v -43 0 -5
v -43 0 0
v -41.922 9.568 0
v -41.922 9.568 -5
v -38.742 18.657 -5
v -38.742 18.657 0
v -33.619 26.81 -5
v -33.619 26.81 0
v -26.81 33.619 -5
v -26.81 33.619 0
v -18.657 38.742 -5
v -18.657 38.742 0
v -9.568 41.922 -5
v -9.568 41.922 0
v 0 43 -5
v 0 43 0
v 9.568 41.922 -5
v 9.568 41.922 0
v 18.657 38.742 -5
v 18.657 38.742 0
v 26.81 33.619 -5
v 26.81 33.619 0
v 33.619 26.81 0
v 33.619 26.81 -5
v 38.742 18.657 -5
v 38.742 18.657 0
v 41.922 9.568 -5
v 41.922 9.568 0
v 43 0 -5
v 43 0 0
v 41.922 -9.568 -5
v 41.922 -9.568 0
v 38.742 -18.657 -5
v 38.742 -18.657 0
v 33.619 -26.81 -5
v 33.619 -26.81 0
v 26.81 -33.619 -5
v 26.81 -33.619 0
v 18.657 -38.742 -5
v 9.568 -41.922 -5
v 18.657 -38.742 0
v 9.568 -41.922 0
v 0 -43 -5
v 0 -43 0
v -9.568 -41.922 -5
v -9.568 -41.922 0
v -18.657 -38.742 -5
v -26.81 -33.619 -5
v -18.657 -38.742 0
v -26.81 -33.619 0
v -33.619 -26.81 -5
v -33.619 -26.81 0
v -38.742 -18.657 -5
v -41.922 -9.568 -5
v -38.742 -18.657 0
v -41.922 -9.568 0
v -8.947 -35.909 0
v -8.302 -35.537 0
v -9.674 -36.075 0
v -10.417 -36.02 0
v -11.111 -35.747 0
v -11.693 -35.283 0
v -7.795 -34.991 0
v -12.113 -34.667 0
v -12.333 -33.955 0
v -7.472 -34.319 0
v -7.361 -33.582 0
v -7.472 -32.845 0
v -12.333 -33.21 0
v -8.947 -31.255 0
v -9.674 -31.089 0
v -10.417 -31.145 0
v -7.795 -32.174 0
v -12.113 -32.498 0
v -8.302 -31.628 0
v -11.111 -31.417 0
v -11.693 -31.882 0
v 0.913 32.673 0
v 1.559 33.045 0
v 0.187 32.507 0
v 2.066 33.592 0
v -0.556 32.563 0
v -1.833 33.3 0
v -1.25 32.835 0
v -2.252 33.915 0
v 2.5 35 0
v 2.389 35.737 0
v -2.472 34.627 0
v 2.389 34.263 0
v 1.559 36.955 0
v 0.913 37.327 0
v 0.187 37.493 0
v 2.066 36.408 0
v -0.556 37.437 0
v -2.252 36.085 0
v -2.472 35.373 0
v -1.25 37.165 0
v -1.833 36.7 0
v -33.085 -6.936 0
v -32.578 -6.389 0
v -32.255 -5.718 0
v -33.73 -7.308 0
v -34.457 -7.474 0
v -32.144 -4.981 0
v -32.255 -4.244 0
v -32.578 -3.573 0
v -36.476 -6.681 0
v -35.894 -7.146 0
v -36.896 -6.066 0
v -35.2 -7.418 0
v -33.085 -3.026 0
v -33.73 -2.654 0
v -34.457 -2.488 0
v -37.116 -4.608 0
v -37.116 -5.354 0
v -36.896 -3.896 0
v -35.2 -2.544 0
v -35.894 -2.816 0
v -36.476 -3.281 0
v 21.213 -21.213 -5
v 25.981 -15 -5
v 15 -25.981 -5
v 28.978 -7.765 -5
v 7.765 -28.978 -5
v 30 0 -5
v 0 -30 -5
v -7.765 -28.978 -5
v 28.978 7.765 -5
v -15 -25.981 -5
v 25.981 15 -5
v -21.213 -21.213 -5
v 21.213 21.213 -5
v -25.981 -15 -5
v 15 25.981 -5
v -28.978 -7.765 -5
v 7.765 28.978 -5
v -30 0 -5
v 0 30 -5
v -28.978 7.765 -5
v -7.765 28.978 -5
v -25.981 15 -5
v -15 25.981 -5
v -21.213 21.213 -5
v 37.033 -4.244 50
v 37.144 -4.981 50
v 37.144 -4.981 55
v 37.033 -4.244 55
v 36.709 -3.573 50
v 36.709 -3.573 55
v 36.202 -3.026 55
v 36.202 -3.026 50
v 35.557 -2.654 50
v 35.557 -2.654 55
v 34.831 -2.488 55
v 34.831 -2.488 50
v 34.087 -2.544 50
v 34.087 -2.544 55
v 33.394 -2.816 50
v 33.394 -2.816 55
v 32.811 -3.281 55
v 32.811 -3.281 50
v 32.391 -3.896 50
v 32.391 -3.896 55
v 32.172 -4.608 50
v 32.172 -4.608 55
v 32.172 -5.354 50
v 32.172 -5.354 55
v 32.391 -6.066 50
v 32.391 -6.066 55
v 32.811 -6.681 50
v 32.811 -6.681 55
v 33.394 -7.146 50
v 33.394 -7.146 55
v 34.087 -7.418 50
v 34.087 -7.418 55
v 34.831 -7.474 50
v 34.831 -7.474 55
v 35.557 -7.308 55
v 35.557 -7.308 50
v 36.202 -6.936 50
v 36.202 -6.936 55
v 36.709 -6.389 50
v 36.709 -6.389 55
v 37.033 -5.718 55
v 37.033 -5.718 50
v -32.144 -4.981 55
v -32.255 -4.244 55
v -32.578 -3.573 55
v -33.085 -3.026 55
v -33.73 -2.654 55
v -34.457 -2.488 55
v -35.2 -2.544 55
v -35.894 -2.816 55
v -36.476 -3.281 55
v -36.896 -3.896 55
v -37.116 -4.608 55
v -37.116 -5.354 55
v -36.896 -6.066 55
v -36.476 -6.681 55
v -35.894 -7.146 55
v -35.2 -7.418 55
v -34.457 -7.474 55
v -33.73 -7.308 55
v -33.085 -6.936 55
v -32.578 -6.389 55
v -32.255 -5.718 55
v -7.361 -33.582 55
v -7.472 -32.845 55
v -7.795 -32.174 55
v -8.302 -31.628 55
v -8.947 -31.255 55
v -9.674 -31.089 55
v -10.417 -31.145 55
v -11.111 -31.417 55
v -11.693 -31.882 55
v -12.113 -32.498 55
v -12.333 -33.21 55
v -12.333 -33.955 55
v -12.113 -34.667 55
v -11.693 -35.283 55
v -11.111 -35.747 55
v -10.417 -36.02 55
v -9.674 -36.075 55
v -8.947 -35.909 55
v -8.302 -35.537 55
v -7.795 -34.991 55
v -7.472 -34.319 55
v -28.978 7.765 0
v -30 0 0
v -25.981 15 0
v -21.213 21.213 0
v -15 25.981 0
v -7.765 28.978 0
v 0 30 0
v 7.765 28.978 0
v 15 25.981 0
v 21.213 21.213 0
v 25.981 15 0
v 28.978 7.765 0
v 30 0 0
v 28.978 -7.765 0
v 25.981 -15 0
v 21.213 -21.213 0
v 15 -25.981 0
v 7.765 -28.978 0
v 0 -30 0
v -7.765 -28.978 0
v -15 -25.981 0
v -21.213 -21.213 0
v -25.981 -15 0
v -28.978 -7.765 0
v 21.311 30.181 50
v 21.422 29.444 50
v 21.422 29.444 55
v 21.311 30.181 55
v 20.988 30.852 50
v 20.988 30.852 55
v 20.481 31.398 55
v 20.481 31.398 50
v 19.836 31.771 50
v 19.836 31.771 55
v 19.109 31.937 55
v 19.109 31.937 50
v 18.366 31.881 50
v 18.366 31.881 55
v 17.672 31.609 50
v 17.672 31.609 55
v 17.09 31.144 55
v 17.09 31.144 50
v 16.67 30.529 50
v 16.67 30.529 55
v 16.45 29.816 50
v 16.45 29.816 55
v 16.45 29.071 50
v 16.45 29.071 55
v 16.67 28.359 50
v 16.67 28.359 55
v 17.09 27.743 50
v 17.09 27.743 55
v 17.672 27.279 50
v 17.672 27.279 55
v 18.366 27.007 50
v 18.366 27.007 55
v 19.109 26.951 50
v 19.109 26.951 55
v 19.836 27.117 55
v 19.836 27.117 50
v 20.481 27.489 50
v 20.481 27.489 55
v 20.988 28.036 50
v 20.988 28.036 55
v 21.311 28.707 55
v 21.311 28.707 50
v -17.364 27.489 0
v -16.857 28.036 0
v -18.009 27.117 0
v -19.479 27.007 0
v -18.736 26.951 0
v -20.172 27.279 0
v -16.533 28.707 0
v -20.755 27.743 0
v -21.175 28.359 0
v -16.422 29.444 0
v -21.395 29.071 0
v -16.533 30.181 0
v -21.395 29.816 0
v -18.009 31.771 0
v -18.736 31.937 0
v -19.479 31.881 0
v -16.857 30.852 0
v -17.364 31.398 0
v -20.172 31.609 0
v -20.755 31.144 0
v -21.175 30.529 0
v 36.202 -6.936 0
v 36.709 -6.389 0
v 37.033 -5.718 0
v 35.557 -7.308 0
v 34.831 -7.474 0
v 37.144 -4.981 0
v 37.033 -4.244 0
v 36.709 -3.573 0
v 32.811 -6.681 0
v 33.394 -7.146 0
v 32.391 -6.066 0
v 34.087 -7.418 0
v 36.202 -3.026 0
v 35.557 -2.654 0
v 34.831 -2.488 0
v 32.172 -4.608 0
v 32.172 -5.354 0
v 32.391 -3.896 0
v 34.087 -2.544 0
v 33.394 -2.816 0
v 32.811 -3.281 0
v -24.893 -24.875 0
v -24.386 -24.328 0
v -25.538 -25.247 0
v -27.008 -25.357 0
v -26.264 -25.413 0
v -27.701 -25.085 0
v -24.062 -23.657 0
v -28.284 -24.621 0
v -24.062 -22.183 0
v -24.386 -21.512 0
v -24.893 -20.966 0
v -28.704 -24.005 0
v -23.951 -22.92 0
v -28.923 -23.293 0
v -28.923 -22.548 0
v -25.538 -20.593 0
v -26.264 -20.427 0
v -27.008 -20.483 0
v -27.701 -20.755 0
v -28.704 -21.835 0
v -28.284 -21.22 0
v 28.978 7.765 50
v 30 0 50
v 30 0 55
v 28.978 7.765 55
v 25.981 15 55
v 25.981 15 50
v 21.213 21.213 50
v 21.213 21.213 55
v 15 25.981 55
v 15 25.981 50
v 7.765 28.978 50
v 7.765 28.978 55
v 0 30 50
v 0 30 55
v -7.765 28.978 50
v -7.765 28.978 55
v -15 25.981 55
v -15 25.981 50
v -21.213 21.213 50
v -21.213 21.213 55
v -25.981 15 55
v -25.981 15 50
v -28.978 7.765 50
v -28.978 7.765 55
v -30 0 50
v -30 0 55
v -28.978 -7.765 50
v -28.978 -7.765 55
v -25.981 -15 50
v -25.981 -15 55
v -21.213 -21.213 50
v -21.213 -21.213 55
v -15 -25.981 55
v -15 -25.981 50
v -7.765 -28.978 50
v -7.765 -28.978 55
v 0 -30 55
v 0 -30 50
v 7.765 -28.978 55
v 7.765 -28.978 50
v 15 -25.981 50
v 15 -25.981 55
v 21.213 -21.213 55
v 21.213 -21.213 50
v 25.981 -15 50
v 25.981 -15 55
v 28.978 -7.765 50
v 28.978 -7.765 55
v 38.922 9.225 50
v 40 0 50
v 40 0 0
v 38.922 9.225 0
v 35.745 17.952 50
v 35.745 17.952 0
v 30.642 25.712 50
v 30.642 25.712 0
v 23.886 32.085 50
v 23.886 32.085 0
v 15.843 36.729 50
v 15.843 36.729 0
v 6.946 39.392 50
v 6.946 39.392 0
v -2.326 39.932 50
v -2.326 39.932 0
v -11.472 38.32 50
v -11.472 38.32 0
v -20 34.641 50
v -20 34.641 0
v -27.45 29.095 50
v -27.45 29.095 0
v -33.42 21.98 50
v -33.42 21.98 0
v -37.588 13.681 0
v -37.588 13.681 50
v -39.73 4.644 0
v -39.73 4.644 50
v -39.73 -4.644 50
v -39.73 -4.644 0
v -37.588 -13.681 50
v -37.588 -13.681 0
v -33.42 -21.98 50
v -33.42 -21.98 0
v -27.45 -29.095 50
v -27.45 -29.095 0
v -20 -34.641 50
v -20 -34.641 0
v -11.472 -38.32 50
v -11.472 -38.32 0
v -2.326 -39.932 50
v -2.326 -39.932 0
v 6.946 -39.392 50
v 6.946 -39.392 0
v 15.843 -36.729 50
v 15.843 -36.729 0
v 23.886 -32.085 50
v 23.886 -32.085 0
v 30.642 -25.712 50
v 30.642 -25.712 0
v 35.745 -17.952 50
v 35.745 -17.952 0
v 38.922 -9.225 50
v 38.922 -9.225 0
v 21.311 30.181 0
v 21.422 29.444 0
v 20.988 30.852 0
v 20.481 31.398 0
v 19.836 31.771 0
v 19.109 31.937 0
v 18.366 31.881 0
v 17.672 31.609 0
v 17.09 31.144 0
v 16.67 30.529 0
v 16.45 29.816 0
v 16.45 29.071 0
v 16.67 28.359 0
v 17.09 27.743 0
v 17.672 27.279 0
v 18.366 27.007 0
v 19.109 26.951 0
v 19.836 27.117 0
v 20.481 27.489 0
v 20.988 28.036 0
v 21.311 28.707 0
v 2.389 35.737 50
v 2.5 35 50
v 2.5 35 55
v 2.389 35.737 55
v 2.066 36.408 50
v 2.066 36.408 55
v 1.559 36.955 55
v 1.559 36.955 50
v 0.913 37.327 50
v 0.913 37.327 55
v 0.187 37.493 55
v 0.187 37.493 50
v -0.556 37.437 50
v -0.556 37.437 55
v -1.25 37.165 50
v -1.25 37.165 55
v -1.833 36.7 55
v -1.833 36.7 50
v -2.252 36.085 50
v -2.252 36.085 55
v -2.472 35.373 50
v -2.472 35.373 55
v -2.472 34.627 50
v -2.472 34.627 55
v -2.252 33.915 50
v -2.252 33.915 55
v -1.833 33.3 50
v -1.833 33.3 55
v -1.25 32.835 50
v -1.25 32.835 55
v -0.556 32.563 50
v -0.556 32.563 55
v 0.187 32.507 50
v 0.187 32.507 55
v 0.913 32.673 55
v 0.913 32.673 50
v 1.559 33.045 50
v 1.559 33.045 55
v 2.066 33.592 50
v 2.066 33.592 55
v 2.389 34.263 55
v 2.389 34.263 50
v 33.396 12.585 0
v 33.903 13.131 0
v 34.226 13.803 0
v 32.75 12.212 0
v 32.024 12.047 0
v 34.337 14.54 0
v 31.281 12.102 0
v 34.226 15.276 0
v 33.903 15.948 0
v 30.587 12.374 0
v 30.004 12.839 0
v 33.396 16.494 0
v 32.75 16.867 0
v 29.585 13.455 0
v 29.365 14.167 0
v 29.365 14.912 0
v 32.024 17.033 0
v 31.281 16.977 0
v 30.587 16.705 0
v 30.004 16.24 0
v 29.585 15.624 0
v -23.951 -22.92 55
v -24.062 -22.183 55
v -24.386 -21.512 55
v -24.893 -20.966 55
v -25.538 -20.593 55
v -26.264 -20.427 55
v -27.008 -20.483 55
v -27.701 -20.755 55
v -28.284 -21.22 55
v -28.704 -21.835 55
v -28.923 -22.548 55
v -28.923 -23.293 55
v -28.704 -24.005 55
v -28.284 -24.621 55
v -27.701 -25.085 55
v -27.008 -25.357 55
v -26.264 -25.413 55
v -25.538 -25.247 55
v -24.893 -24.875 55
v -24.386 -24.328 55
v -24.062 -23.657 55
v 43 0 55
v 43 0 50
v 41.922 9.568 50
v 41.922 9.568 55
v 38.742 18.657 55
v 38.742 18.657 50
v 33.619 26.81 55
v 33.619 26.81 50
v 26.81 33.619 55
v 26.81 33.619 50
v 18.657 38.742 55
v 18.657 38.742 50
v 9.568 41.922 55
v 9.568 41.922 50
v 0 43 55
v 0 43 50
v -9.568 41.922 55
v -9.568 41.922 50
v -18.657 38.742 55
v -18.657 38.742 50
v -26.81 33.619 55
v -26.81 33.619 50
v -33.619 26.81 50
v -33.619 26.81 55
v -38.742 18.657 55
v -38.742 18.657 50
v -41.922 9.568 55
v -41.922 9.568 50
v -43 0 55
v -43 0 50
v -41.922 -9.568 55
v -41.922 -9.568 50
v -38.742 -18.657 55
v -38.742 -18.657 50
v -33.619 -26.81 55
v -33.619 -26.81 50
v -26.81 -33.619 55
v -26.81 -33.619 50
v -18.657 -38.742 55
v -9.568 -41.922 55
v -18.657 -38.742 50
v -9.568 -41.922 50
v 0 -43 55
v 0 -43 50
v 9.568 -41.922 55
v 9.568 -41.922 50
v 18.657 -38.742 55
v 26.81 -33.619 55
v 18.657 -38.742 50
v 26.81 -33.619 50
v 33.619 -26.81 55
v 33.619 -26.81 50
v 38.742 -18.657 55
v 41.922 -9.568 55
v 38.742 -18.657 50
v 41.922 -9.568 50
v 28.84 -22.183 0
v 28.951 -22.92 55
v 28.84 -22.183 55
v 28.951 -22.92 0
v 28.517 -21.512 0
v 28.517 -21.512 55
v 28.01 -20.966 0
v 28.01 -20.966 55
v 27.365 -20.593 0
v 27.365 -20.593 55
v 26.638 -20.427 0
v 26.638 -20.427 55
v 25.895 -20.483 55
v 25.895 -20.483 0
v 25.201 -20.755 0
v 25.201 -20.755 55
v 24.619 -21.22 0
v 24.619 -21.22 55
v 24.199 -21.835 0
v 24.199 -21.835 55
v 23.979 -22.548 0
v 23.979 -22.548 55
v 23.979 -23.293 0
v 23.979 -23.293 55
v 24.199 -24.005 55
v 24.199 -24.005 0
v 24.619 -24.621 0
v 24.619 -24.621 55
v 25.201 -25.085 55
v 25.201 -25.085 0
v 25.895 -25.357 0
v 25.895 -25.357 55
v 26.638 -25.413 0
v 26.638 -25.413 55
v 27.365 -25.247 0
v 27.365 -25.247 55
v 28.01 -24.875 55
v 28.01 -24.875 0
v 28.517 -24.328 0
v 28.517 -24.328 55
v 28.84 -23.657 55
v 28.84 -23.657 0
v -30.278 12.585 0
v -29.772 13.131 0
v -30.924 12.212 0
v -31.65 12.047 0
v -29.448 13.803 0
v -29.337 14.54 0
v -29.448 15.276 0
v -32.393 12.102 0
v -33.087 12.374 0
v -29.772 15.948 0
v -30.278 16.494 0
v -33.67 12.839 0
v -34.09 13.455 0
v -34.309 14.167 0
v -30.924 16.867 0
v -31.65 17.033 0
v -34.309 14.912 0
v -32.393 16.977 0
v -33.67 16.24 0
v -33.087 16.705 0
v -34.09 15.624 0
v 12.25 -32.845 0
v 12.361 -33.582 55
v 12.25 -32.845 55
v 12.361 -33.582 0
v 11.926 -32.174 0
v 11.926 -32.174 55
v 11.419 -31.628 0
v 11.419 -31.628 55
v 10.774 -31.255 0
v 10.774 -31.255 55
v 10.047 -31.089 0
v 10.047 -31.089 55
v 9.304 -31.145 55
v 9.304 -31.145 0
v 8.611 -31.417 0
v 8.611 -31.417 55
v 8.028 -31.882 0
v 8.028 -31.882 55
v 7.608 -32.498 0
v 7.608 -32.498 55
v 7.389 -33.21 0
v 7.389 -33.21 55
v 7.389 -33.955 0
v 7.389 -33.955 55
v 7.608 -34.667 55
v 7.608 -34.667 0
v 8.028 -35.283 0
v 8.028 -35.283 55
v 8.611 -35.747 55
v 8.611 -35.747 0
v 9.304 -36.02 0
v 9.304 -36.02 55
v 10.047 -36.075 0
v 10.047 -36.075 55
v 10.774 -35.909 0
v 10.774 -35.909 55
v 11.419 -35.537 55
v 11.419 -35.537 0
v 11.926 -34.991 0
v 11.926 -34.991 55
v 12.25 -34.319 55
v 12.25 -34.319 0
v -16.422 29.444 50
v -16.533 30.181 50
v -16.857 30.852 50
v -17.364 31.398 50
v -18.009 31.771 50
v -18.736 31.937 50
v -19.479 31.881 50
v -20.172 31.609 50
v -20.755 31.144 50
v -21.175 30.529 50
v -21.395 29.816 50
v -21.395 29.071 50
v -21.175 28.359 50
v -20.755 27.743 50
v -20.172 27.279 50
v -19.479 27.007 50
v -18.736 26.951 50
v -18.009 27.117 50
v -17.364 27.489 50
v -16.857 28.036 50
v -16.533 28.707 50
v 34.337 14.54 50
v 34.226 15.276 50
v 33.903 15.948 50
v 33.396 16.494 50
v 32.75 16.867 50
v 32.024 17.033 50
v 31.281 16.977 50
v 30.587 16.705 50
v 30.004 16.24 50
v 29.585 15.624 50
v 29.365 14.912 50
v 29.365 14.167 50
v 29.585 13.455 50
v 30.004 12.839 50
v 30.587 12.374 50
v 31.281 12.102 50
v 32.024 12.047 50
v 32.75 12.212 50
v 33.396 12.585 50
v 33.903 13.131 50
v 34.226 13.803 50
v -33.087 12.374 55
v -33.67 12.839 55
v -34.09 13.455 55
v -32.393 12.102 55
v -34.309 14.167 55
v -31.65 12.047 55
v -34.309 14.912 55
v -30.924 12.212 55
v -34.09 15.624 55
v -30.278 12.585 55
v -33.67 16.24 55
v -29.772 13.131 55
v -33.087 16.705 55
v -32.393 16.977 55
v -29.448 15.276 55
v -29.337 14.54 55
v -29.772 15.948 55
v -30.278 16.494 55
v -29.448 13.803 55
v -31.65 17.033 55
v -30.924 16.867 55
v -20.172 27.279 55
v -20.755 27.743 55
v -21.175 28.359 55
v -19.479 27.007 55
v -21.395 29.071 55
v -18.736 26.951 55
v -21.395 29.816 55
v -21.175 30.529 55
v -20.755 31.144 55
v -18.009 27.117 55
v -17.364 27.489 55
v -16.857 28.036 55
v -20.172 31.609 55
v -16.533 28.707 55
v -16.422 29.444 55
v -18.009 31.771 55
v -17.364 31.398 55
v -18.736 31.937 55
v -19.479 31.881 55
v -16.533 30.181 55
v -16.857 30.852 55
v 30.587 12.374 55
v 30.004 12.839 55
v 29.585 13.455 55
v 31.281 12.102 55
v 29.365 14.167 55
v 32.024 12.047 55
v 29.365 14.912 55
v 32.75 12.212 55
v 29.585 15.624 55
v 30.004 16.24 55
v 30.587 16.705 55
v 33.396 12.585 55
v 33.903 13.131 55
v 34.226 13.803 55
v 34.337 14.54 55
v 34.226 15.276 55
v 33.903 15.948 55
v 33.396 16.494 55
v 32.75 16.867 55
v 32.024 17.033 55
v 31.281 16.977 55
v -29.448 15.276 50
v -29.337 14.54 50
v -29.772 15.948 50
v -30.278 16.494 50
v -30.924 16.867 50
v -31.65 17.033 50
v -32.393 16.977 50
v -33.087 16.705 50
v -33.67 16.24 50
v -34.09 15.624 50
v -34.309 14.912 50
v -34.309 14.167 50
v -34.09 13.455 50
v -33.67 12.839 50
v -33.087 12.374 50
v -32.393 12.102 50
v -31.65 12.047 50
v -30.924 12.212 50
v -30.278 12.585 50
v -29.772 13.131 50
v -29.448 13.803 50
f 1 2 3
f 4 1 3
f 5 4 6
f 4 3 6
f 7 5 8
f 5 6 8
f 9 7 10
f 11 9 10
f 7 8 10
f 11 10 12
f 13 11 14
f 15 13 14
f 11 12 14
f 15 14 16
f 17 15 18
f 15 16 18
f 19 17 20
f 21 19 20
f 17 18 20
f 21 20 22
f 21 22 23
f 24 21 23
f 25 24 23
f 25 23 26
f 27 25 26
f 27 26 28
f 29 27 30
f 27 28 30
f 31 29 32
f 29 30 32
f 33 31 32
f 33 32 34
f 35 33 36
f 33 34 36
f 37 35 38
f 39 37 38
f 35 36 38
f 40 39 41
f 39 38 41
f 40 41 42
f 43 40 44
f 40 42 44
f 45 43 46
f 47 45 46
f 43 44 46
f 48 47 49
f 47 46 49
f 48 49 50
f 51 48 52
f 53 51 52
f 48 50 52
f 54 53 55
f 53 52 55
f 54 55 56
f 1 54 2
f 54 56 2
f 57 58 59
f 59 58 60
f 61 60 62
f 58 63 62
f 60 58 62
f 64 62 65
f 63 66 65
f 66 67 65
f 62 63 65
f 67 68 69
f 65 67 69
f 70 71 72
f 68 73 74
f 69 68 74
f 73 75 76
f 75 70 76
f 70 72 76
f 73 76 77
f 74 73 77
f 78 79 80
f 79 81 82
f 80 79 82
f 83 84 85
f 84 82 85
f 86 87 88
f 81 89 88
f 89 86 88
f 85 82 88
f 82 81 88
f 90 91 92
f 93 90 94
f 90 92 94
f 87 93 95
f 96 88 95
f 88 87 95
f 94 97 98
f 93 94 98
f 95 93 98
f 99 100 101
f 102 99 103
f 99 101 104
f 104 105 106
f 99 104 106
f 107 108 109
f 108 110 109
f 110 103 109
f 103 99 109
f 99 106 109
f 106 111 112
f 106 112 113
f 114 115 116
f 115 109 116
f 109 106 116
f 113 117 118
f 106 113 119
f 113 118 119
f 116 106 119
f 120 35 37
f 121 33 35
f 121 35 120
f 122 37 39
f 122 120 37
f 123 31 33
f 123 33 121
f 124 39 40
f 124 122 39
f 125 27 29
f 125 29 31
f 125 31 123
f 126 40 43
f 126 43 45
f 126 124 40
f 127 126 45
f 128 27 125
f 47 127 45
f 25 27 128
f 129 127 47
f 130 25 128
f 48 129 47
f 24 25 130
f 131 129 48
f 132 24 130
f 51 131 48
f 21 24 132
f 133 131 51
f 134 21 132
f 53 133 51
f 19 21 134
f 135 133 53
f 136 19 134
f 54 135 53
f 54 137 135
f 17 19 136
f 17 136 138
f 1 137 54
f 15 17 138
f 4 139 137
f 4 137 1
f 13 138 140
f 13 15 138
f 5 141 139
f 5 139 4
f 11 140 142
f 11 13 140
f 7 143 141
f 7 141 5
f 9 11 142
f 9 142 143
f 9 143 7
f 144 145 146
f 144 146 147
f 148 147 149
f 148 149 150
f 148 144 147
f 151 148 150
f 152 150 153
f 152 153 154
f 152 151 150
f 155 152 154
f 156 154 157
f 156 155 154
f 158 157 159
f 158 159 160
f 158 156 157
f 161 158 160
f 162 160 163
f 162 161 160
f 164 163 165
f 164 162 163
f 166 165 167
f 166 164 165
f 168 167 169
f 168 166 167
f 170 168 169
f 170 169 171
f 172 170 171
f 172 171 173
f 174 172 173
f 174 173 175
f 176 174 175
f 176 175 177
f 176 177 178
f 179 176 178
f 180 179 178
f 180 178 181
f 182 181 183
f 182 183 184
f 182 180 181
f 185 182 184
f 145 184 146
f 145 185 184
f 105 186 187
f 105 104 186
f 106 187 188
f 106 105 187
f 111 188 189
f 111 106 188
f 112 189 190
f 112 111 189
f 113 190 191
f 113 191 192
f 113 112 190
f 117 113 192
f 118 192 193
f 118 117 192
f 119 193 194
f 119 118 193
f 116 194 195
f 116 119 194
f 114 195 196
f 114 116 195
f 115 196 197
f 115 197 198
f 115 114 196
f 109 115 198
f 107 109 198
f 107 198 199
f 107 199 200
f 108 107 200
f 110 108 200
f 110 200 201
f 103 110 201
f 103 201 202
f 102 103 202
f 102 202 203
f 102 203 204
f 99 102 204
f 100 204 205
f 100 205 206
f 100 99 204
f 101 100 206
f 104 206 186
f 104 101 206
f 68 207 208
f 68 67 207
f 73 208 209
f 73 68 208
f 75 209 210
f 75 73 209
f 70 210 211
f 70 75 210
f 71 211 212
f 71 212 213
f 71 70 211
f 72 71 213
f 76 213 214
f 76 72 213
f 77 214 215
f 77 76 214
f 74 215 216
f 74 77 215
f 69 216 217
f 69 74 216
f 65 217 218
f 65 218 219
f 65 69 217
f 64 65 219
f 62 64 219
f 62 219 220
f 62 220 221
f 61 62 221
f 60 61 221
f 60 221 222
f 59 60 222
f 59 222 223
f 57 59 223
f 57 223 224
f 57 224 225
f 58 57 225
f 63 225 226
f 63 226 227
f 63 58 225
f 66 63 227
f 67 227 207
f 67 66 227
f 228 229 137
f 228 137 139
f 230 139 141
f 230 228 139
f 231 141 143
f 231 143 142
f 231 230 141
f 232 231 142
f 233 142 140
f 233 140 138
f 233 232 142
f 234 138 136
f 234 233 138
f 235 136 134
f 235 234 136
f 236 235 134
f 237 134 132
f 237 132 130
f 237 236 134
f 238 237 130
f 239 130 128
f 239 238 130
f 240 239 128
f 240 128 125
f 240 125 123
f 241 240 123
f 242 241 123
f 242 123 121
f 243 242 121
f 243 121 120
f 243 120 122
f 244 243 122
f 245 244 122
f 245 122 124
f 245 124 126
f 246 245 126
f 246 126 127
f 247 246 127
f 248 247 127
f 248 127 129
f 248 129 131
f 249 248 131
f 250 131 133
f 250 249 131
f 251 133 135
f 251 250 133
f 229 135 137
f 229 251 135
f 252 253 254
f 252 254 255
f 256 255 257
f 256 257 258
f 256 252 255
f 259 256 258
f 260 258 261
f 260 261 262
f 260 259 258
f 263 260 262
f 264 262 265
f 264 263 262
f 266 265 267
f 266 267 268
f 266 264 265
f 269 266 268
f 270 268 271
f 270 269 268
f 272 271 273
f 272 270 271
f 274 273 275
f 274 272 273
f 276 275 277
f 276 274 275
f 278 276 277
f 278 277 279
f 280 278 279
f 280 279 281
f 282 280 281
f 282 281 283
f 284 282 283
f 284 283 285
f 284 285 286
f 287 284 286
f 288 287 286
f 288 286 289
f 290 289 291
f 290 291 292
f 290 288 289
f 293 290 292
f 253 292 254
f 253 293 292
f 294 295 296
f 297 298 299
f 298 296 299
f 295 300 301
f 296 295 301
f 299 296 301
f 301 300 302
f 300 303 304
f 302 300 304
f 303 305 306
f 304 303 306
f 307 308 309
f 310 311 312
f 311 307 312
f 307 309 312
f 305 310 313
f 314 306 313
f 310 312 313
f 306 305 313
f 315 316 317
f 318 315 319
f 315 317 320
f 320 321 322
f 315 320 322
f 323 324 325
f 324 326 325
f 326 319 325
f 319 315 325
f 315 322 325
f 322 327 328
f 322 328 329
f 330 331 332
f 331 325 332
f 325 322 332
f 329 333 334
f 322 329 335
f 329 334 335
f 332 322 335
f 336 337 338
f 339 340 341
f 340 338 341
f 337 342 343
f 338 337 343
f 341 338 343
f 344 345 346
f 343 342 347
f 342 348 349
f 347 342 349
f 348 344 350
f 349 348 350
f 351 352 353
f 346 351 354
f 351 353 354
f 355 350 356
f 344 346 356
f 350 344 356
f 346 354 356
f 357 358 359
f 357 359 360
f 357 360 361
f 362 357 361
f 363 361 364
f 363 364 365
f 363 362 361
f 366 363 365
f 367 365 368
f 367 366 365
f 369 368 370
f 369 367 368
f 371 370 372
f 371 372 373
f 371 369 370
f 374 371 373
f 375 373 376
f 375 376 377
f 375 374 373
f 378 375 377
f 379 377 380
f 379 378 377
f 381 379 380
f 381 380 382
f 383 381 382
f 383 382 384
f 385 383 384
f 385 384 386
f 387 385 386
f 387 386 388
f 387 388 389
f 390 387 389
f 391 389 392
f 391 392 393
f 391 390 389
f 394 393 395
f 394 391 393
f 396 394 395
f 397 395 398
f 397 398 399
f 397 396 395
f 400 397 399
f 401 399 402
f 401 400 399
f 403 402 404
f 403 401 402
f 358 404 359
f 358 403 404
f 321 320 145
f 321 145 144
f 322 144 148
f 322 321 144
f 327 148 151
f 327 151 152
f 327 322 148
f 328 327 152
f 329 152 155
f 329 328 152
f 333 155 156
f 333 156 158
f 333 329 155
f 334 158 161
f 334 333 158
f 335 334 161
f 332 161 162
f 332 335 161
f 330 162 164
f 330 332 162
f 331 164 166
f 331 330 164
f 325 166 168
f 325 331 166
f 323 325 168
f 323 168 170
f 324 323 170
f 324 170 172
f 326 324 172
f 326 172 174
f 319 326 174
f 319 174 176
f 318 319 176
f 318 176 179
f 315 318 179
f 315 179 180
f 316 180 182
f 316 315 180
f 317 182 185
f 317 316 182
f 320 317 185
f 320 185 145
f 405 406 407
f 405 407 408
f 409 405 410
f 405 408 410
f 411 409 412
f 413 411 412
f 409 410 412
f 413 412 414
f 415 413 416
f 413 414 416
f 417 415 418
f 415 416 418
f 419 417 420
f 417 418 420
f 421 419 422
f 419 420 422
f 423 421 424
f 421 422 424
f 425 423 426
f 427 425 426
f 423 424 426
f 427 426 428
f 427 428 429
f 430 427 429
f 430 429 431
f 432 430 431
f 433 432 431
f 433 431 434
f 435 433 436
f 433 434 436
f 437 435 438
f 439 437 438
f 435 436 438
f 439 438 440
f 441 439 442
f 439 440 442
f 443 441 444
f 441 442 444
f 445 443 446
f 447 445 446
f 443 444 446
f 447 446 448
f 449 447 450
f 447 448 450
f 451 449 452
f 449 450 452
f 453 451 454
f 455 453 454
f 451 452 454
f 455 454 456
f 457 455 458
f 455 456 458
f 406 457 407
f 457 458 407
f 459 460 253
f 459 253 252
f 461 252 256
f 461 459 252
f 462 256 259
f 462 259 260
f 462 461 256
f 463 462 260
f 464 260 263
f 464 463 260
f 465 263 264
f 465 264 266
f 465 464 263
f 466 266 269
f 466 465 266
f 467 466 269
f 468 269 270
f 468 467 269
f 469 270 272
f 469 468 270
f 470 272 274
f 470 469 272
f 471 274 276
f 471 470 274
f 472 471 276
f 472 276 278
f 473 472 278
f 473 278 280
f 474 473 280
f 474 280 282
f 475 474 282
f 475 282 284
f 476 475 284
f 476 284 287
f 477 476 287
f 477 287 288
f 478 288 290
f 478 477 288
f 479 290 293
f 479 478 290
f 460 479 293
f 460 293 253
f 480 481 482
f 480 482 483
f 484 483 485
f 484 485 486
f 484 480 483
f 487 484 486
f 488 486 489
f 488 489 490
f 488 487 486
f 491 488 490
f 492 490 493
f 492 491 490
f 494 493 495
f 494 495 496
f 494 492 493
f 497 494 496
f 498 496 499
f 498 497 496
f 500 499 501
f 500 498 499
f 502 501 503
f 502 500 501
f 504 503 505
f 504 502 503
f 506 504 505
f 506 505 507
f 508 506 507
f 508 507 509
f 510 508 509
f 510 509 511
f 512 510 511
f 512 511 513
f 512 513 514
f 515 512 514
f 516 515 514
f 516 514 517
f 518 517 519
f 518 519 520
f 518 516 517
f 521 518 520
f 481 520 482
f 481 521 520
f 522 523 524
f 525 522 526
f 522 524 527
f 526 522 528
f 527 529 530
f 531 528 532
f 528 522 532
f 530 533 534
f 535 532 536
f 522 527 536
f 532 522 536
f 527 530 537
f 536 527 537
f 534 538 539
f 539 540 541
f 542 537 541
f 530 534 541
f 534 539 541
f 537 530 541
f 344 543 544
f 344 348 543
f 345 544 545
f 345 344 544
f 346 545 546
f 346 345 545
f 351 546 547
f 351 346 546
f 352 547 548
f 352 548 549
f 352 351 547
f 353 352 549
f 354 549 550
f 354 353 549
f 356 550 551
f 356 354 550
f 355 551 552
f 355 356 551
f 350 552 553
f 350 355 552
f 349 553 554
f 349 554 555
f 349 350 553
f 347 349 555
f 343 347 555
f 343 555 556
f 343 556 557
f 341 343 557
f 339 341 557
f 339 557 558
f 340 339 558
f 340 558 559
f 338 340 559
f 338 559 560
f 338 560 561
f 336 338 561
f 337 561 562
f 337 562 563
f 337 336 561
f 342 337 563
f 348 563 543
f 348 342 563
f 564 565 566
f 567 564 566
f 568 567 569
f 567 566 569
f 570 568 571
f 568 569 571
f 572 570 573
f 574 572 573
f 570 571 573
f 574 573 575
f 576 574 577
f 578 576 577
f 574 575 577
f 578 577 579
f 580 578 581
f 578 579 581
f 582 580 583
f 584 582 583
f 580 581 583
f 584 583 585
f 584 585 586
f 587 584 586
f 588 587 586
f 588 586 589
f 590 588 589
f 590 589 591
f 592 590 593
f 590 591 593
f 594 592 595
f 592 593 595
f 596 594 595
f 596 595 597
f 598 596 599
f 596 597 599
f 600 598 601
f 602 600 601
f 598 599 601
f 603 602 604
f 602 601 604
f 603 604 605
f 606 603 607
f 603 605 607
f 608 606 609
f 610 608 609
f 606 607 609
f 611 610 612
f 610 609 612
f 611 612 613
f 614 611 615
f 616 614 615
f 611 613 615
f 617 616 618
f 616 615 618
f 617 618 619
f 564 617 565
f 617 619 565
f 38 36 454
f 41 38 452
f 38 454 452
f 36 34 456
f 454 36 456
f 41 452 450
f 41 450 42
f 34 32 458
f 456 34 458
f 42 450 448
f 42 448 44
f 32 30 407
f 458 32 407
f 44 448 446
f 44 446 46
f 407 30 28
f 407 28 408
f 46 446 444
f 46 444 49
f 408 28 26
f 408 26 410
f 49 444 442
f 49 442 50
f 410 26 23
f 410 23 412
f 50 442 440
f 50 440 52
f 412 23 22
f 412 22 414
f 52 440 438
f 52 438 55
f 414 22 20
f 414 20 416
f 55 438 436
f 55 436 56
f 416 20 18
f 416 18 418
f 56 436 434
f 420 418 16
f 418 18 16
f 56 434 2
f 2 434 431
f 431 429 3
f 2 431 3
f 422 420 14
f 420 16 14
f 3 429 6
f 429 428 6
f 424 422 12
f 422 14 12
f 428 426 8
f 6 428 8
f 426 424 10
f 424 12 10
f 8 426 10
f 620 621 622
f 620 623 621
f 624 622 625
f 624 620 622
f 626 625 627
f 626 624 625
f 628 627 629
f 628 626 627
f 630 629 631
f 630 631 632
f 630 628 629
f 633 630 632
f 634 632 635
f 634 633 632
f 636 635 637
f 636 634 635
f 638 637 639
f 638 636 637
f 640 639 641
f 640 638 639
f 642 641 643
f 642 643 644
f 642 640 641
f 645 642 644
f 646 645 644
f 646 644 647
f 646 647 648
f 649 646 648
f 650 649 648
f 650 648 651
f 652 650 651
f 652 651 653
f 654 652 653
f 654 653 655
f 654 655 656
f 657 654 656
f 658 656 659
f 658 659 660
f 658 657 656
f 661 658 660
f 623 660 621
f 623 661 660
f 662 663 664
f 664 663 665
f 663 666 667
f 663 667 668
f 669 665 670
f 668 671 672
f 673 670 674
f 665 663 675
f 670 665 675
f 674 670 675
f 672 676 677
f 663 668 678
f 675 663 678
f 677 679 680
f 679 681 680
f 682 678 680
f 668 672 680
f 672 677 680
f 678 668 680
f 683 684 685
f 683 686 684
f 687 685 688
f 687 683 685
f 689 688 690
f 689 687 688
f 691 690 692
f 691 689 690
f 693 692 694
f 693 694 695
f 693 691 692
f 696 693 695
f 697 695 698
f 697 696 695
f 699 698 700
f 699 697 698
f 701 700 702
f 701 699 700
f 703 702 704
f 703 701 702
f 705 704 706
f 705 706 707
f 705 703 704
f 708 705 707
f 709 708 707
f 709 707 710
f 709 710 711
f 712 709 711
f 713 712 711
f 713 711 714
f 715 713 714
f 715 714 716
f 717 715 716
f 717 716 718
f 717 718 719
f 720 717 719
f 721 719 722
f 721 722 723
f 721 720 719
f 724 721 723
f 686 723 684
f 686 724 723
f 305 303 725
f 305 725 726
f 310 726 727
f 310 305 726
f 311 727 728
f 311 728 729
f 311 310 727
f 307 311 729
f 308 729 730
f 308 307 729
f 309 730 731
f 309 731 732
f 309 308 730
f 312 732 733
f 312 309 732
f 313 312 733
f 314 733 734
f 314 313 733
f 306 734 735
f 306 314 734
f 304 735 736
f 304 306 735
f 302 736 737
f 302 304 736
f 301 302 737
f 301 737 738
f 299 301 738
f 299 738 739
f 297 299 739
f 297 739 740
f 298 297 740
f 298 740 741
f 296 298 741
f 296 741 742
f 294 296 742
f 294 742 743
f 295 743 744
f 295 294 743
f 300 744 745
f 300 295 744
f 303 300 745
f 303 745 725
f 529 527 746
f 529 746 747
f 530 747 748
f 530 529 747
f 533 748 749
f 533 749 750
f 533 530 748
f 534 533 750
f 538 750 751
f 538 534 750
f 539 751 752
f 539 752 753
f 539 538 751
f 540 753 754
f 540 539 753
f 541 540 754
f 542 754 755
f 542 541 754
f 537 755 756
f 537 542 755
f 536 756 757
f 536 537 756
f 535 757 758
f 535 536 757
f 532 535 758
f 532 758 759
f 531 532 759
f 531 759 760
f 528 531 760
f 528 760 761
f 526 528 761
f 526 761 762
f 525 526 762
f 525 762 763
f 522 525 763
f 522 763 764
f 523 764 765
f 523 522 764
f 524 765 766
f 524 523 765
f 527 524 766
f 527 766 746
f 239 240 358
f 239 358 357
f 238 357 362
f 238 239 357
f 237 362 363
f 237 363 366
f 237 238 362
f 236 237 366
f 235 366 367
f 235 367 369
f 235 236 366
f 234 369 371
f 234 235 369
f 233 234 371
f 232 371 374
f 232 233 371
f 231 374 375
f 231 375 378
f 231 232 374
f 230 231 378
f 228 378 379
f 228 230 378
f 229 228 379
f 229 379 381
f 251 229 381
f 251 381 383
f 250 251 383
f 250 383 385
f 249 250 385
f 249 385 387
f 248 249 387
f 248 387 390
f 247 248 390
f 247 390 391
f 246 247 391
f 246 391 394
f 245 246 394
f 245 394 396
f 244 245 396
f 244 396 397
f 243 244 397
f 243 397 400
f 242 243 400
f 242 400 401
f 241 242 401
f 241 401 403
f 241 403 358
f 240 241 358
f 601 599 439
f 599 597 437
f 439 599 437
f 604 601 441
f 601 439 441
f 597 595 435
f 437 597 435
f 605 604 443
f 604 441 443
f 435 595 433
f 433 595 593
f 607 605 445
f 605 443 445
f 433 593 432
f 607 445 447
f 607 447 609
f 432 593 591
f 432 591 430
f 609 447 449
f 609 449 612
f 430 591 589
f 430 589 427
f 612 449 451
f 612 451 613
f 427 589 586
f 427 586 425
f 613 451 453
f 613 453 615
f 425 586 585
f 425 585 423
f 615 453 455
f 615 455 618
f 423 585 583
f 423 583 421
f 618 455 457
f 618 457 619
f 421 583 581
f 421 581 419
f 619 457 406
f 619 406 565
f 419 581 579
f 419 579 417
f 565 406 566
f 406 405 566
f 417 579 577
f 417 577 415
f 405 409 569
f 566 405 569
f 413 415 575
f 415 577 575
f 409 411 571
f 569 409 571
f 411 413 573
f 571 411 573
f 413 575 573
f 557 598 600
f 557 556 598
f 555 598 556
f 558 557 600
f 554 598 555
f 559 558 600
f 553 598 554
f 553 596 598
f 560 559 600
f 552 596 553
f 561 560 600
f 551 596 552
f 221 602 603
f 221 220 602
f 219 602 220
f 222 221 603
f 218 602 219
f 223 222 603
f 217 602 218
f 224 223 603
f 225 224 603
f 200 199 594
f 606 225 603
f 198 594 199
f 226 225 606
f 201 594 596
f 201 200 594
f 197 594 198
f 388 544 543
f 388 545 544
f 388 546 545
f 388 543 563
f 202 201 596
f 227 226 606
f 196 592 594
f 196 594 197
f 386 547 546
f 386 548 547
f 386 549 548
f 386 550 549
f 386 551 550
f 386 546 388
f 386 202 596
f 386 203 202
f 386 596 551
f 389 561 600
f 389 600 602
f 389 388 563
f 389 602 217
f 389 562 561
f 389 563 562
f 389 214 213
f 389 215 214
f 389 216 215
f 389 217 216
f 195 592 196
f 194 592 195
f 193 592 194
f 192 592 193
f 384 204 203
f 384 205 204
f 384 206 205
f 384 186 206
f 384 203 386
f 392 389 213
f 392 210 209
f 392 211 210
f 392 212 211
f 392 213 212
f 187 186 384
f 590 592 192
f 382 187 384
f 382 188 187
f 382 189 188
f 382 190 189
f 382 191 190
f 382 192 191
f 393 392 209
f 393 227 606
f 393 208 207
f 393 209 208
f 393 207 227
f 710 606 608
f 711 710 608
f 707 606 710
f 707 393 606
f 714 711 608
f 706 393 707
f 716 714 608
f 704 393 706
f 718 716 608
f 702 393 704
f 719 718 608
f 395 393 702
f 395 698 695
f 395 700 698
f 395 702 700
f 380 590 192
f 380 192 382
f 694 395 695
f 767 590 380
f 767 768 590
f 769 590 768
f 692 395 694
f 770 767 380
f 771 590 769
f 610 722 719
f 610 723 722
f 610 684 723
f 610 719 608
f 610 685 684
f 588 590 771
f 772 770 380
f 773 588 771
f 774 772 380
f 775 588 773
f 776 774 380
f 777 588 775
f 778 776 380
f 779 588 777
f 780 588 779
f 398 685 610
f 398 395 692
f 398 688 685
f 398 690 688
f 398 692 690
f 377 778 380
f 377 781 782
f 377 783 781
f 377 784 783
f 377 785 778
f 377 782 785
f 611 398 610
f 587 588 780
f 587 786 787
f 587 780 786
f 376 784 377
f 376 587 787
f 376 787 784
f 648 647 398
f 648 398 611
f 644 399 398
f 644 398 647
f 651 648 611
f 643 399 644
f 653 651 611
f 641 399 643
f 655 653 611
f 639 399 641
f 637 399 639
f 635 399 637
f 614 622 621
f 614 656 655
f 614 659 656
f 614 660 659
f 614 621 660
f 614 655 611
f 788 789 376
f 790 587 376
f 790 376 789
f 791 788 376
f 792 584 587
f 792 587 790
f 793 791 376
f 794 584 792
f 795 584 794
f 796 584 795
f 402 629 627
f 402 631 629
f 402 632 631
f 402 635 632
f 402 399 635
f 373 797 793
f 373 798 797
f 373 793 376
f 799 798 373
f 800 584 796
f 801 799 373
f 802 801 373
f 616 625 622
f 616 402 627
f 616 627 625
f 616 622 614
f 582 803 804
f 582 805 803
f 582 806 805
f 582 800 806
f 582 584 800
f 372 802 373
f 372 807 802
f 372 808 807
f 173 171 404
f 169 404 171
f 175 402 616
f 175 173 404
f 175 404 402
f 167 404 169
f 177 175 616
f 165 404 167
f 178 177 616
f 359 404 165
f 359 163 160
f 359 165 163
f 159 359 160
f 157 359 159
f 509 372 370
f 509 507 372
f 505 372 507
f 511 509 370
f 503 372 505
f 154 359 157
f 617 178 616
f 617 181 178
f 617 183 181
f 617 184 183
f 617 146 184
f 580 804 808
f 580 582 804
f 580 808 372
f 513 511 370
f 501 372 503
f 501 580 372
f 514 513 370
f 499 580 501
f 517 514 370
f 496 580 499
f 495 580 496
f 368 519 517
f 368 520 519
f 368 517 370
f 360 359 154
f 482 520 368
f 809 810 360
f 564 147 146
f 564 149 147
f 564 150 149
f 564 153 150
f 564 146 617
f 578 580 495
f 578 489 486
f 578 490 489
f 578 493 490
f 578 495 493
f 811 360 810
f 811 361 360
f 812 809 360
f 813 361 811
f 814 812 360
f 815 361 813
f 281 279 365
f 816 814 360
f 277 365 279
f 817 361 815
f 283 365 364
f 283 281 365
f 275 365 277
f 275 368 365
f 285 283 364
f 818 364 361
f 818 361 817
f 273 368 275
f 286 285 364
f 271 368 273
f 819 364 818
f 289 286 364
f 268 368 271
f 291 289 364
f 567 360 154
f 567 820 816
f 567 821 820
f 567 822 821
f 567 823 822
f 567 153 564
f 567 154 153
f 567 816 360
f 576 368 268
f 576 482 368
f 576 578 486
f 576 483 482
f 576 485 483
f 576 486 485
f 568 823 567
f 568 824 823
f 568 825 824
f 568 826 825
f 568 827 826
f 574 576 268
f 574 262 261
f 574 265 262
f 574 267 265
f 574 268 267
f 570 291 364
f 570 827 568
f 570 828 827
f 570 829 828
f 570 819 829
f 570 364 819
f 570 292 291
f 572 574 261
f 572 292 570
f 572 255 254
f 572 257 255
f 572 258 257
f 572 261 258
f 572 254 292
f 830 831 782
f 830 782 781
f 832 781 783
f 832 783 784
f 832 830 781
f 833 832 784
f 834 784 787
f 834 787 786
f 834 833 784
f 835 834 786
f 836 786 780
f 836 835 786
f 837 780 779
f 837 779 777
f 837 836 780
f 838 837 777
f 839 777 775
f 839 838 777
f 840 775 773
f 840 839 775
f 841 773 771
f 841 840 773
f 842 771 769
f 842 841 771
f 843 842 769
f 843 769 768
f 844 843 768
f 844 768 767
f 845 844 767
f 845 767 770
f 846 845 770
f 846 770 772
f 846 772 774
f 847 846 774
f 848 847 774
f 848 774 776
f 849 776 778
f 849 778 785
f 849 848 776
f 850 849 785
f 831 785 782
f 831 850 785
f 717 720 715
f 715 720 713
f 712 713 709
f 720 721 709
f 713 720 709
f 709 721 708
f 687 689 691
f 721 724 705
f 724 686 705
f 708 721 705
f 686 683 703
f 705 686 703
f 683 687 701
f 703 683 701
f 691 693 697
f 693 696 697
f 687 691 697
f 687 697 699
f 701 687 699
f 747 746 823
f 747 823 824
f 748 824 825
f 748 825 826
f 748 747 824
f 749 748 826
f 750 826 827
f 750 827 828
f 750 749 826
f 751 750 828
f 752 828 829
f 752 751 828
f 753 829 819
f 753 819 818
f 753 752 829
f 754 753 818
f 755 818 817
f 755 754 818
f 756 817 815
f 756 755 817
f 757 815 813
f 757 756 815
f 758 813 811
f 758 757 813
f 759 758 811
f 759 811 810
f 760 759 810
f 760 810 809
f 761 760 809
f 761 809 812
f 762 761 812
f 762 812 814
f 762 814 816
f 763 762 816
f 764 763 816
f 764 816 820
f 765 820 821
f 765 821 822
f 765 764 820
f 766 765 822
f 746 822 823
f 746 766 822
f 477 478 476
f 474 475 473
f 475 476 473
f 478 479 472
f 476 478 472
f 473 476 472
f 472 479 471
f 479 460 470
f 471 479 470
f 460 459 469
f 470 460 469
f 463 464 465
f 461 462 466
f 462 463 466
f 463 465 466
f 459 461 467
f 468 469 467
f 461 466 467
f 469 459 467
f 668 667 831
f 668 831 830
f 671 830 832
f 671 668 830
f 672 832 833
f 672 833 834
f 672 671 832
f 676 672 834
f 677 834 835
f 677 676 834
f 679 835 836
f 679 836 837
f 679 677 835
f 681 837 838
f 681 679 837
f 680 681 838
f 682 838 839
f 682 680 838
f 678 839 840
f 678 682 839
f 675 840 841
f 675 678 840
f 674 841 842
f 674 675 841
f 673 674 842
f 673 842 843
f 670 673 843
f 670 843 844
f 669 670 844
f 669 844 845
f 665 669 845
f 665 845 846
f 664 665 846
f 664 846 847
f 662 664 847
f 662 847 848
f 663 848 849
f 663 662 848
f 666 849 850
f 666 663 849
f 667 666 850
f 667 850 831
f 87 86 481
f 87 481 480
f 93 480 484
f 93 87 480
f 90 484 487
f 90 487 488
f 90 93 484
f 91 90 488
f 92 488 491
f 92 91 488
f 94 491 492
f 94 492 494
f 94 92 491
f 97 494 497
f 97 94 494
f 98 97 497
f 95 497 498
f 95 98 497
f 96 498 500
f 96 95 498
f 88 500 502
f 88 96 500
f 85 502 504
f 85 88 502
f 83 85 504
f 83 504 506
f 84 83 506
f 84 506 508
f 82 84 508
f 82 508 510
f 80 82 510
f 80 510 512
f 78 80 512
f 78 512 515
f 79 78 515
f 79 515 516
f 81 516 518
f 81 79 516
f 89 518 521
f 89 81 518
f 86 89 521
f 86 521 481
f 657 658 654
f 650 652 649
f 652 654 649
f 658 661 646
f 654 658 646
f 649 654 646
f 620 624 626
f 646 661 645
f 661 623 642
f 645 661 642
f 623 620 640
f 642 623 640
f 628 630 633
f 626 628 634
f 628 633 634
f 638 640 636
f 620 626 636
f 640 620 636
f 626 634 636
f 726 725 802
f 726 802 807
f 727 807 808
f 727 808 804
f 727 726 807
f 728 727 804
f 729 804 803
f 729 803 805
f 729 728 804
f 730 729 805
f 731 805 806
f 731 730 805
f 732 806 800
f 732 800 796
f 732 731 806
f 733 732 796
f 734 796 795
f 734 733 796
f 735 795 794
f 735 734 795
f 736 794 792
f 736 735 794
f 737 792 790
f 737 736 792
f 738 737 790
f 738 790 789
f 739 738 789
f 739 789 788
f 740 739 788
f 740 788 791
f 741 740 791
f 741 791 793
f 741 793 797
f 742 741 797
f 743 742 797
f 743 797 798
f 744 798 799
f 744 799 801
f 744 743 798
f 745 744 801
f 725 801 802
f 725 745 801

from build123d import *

# Parameters (mm, degrees)
SKETCH1_R           = 40
SKETCH1_R_2         = 30
SKETCH1_R_3         = 2.5
BOSS_EXTRUDE1_DEPTH = 50
SKETCH2_R           = 43
SKETCH2_R_2         = 30
BOSS_EXTRUDE2_DEPTH = 5
SKETCH3_R           = 43
SKETCH3_R_2         = 30
SKETCH3_R_3         = 2.5
BOSS_EXTRUDE3_DEPTH = 5


with BuildPart() as part:
    # Sketch1 → Boss-Extrude1 (new body)
    with BuildSketch(Plane.XY):
        Circle(SKETCH1_R)
        Circle(SKETCH1_R_2, mode=Mode.SUBTRACT)
        with Locations((0, 35)):
            Circle(SKETCH1_R_3, mode=Mode.SUBTRACT)
        with Locations((18.922428611, 29.443873649)):
            Circle(SKETCH1_R_3, mode=Mode.SUBTRACT)
        with Locations((31.837119837, 14.539525455)):
            Circle(SKETCH1_R_3, mode=Mode.SUBTRACT)
        with Locations((34.643750466, -4.98101934)):
            Circle(SKETCH1_R_3, mode=Mode.SUBTRACT)
        with Locations((26.451235102, -22.920125688)):
            Circle(SKETCH1_R_3, mode=Mode.SUBTRACT)
        with Locations((9.860639489, -33.582254077)):
            Circle(SKETCH1_R_3, mode=Mode.SUBTRACT)
        with Locations((-9.860639489, -33.582254077)):
            Circle(SKETCH1_R_3, mode=Mode.SUBTRACT)
        with Locations((-26.451235102, -22.920125688)):
            Circle(SKETCH1_R_3, mode=Mode.SUBTRACT)
        with Locations((-34.643750466, -4.98101934)):
            Circle(SKETCH1_R_3, mode=Mode.SUBTRACT)
        with Locations((-31.837119837, 14.539525455)):
            Circle(SKETCH1_R_3, mode=Mode.SUBTRACT)
        with Locations((-18.922428611, 29.443873649)):
            Circle(SKETCH1_R_3, mode=Mode.SUBTRACT)
    extrude(amount=BOSS_EXTRUDE1_DEPTH)

    # Sketch2 → Boss-Extrude2 (add)
    with BuildSketch(Plane(origin=(0, 0, 0), x_dir=(-1, 0, 0), z_dir=(0, 0, -1))):
        Circle(SKETCH2_R)
        Circle(SKETCH2_R_2, mode=Mode.SUBTRACT)
    extrude(amount=BOSS_EXTRUDE2_DEPTH)

    # Sketch3 → Boss-Extrude3 (add)
    with BuildSketch(Plane.XY.offset(50)):
        Circle(SKETCH3_R)
        Circle(SKETCH3_R_2, mode=Mode.SUBTRACT)
        with Locations((31.837119837, 14.539525455)):
            Circle(SKETCH3_R_3, mode=Mode.SUBTRACT)
        with Locations((34.643750466, -4.98101934)):
            Circle(SKETCH3_R_3, mode=Mode.SUBTRACT)
        with Locations((26.451235102, -22.920125688)):
            Circle(SKETCH3_R_3, mode=Mode.SUBTRACT)
        with Locations((9.860639489, -33.582254077)):
            Circle(SKETCH3_R_3, mode=Mode.SUBTRACT)
        with Locations((-9.860639489, -33.582254077)):
            Circle(SKETCH3_R_3, mode=Mode.SUBTRACT)
        with Locations((-26.451235102, -22.920125688)):
            Circle(SKETCH3_R_3, mode=Mode.SUBTRACT)
        with Locations((-34.643750466, -4.98101934)):
            Circle(SKETCH3_R_3, mode=Mode.SUBTRACT)
        with Locations((-31.837119837, 14.539525455)):
            Circle(SKETCH3_R_3, mode=Mode.SUBTRACT)
        with Locations((-18.922428611, 29.443873649)):
            Circle(SKETCH3_R_3, mode=Mode.SUBTRACT)
        with Locations((0, 35)):
            Circle(SKETCH3_R_3, mode=Mode.SUBTRACT)
        with Locations((18.922428611, 29.443873649)):
            Circle(SKETCH3_R_3, mode=Mode.SUBTRACT)
    extrude(amount=BOSS_EXTRUDE3_DEPTH)


solid = part.part
